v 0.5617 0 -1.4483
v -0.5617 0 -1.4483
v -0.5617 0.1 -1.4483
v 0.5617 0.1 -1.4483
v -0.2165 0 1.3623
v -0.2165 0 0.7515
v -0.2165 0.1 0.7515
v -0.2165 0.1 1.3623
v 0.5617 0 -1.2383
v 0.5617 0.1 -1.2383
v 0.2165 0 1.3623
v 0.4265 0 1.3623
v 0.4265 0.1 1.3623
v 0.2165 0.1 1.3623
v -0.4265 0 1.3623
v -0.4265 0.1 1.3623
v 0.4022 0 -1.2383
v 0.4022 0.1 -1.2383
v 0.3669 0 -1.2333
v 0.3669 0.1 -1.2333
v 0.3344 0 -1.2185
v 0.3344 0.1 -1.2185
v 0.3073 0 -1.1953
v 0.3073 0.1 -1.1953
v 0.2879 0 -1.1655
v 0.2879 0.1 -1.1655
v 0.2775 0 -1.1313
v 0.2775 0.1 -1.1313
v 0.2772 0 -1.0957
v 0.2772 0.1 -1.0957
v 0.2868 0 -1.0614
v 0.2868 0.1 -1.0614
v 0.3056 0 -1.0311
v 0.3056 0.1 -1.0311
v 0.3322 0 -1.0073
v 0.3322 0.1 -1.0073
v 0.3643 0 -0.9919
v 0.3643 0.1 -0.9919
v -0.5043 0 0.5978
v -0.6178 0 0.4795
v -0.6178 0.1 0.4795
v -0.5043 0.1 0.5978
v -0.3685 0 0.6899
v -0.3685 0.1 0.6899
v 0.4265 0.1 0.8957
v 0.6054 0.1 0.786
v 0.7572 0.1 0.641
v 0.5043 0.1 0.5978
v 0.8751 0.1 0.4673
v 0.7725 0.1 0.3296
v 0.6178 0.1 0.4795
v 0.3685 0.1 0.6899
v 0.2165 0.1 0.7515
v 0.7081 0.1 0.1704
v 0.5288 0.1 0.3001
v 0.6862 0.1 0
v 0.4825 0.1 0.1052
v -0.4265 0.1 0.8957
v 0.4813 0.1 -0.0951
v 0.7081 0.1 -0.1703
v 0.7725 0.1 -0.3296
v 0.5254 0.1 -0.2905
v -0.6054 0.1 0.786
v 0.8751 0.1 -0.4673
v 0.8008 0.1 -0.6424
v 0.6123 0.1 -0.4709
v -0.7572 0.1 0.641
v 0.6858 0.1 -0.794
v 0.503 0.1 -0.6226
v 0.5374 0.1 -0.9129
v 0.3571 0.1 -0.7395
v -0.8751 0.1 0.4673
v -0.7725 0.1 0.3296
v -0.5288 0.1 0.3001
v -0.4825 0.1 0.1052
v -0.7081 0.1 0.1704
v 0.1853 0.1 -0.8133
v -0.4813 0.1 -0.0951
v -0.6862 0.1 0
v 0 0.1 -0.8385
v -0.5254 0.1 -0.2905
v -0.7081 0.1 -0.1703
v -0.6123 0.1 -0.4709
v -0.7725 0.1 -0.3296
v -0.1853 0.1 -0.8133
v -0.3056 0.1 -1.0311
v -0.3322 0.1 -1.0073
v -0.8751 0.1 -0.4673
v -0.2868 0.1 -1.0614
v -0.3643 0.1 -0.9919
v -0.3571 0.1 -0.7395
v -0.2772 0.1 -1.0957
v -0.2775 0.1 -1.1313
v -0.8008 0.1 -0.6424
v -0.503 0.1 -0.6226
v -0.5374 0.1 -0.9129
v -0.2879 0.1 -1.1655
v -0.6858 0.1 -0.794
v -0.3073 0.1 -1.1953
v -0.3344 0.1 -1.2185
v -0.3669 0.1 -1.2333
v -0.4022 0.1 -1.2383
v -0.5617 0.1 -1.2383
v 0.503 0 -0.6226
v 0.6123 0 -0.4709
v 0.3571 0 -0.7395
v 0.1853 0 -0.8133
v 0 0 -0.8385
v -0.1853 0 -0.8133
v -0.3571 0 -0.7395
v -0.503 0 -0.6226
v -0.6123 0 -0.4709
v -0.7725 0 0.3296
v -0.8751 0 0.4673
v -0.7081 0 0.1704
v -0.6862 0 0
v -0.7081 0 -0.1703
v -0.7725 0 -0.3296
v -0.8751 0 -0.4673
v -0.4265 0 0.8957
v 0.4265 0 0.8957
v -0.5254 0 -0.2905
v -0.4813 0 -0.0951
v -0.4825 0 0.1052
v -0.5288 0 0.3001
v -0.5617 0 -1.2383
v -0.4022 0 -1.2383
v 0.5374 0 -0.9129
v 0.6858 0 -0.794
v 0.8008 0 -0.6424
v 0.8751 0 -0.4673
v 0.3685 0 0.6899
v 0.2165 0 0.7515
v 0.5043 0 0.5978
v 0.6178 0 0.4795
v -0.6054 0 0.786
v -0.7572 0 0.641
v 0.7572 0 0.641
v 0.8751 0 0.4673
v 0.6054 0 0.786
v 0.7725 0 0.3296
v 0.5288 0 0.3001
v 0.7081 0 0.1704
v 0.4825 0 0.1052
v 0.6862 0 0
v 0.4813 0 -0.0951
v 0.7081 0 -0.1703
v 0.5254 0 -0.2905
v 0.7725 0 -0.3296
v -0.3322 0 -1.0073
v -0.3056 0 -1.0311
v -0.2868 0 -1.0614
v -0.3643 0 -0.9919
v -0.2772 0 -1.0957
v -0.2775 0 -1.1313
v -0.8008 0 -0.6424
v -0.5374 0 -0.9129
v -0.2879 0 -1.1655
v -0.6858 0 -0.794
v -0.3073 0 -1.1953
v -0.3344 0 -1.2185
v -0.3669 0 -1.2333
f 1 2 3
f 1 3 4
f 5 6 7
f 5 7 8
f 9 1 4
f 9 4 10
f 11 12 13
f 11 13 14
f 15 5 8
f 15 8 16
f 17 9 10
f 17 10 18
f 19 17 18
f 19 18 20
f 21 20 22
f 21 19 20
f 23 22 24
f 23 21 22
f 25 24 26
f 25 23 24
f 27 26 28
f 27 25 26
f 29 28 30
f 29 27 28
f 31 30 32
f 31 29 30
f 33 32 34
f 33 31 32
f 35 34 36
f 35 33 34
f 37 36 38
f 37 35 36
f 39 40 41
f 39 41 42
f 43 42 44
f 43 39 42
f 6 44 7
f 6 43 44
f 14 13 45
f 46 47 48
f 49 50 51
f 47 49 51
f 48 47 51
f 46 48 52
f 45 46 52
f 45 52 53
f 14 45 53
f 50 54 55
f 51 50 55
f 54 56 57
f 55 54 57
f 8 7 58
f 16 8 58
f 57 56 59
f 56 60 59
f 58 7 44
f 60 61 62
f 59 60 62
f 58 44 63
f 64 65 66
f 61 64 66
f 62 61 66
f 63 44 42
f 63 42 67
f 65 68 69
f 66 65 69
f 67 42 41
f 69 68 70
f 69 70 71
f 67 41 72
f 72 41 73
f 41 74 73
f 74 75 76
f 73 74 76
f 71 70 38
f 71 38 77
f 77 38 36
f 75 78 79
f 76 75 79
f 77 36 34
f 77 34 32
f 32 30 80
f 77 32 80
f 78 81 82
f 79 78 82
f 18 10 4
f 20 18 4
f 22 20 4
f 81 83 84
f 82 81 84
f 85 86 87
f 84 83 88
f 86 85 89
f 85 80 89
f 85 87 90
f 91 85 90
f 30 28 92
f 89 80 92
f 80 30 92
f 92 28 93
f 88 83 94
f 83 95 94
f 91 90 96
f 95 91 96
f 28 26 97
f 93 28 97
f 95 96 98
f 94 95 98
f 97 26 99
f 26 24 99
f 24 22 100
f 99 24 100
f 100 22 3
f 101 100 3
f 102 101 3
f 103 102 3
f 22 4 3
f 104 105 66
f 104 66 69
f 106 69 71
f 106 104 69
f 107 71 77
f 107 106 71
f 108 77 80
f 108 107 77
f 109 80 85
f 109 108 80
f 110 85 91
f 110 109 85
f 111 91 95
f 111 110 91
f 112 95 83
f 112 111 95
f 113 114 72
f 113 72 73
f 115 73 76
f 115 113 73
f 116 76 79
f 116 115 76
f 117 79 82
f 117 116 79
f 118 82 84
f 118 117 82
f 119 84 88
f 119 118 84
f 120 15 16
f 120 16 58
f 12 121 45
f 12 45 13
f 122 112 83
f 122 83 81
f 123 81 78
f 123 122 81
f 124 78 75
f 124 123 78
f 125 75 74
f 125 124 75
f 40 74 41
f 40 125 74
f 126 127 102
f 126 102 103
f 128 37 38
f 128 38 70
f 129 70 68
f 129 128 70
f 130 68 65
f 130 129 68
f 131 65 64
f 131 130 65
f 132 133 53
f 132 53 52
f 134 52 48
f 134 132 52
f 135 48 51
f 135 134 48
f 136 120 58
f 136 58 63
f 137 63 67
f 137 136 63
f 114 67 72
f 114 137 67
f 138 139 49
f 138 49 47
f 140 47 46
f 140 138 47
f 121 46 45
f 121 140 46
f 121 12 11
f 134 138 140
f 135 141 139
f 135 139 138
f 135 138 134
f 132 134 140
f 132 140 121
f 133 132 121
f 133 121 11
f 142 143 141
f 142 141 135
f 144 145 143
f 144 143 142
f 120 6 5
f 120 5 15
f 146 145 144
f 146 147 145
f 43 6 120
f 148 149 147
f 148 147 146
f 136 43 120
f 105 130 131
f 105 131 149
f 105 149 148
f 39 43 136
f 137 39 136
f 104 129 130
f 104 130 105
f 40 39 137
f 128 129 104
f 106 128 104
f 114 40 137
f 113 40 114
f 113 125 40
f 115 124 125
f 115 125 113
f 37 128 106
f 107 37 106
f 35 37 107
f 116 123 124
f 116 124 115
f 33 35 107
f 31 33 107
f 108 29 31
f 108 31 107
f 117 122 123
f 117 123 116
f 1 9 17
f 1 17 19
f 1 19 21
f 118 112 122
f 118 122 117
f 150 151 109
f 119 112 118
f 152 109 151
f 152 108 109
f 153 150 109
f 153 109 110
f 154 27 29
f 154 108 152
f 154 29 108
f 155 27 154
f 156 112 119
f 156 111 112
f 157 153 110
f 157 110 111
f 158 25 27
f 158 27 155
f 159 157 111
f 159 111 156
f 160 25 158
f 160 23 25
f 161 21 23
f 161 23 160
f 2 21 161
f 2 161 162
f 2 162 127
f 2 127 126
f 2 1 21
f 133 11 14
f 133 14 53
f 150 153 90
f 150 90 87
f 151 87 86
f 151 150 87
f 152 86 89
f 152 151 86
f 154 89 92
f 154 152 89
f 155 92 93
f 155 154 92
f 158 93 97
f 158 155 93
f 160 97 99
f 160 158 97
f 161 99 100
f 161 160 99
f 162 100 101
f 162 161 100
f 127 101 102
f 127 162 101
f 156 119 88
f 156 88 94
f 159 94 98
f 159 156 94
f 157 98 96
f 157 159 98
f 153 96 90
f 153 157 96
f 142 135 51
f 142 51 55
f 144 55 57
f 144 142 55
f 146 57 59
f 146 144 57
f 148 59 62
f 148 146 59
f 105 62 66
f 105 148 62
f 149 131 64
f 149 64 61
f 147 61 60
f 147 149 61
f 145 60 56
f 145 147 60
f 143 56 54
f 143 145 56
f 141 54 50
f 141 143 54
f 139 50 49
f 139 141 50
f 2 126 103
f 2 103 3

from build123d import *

# Parameters (mm, degrees)
BOSS_EXTRUDE1_DEPTH = 0.1


with BuildPart() as part:
    # Sketch1 → Boss-Extrude1 (new body)
    with BuildSketch(Plane(origin=(0, 0, 0), x_dir=(1, 0, 0), z_dir=(0, 1, 0))):
        with BuildLine():
            Line((-0.5617, 1.4483), (0.5617, 1.4483))
            Line((0.5617, 1.4483), (0.5617, 1.2383))
            Line((0.5617, 1.2383), (0.402164983, 1.2383))
            ThreePointArc((0.402164983, 1.2383), (0.277526345, 1.131342099), (0.364324457, 0.991911577))
            ThreePointArc((0.364324457, 0.991911577), (0.68584629, 0.794012708), (0.875117893, 0.467337775))
            ThreePointArc((0.875117893, 0.467337775), (0.6862, -7.013e-06), (0.87512764, -0.467347861))
            ThreePointArc((0.87512764, -0.467347861), (0.685156757, -0.717511413), (0.4265, -0.895745589))
            Line((0.4265, -0.895745589), (0.4265, -1.3623))
            Line((0.4265, -1.3623), (0.2165, -1.3623))
            Line((0.2165, -1.3623), (0.2165, -0.751537198))
            ThreePointArc((0.2165, -0.751537198), (0.438784382, -0.647416926), (0.617847888, -0.479525179))
            ThreePointArc((0.617847888, -0.479525179), (0.476214849, -0.00511934), (0.612334438, 0.470897757))
            ThreePointArc((0.612334438, 0.470897757), (0, 0.8385), (-0.612334438, 0.470897757))
            ThreePointArc((-0.612334438, 0.470897757), (-0.476214849, -0.00511934), (-0.617847888, -0.479525179))
            ThreePointArc((-0.617847888, -0.479525179), (-0.438784382, -0.647416926), (-0.2165, -0.751537198))
            Line((-0.2165, -0.751537198), (-0.2165, -1.3623))
            Line((-0.2165, -1.3623), (-0.4265, -1.3623))
            Line((-0.4265, -1.3623), (-0.4265, -0.895745589))
            ThreePointArc((-0.4265, -0.895745589), (-0.685156757, -0.717511413), (-0.87512764, -0.467347861))
            ThreePointArc((-0.87512764, -0.467347861), (-0.6862, -7.013e-06), (-0.875117893, 0.467337775))
            ThreePointArc((-0.875117893, 0.467337775), (-0.68584629, 0.794012708), (-0.364324457, 0.991911577))
            ThreePointArc((-0.364324457, 0.991911577), (-0.277526345, 1.131342099), (-0.402164983, 1.2383))
            Line((-0.402164983, 1.2383), (-0.5617, 1.2383))
            Line((-0.5617, 1.2383), (-0.5617, 1.4483))
        make_face()
    extrude(amount=BOSS_EXTRUDE1_DEPTH)


solid = part.part
